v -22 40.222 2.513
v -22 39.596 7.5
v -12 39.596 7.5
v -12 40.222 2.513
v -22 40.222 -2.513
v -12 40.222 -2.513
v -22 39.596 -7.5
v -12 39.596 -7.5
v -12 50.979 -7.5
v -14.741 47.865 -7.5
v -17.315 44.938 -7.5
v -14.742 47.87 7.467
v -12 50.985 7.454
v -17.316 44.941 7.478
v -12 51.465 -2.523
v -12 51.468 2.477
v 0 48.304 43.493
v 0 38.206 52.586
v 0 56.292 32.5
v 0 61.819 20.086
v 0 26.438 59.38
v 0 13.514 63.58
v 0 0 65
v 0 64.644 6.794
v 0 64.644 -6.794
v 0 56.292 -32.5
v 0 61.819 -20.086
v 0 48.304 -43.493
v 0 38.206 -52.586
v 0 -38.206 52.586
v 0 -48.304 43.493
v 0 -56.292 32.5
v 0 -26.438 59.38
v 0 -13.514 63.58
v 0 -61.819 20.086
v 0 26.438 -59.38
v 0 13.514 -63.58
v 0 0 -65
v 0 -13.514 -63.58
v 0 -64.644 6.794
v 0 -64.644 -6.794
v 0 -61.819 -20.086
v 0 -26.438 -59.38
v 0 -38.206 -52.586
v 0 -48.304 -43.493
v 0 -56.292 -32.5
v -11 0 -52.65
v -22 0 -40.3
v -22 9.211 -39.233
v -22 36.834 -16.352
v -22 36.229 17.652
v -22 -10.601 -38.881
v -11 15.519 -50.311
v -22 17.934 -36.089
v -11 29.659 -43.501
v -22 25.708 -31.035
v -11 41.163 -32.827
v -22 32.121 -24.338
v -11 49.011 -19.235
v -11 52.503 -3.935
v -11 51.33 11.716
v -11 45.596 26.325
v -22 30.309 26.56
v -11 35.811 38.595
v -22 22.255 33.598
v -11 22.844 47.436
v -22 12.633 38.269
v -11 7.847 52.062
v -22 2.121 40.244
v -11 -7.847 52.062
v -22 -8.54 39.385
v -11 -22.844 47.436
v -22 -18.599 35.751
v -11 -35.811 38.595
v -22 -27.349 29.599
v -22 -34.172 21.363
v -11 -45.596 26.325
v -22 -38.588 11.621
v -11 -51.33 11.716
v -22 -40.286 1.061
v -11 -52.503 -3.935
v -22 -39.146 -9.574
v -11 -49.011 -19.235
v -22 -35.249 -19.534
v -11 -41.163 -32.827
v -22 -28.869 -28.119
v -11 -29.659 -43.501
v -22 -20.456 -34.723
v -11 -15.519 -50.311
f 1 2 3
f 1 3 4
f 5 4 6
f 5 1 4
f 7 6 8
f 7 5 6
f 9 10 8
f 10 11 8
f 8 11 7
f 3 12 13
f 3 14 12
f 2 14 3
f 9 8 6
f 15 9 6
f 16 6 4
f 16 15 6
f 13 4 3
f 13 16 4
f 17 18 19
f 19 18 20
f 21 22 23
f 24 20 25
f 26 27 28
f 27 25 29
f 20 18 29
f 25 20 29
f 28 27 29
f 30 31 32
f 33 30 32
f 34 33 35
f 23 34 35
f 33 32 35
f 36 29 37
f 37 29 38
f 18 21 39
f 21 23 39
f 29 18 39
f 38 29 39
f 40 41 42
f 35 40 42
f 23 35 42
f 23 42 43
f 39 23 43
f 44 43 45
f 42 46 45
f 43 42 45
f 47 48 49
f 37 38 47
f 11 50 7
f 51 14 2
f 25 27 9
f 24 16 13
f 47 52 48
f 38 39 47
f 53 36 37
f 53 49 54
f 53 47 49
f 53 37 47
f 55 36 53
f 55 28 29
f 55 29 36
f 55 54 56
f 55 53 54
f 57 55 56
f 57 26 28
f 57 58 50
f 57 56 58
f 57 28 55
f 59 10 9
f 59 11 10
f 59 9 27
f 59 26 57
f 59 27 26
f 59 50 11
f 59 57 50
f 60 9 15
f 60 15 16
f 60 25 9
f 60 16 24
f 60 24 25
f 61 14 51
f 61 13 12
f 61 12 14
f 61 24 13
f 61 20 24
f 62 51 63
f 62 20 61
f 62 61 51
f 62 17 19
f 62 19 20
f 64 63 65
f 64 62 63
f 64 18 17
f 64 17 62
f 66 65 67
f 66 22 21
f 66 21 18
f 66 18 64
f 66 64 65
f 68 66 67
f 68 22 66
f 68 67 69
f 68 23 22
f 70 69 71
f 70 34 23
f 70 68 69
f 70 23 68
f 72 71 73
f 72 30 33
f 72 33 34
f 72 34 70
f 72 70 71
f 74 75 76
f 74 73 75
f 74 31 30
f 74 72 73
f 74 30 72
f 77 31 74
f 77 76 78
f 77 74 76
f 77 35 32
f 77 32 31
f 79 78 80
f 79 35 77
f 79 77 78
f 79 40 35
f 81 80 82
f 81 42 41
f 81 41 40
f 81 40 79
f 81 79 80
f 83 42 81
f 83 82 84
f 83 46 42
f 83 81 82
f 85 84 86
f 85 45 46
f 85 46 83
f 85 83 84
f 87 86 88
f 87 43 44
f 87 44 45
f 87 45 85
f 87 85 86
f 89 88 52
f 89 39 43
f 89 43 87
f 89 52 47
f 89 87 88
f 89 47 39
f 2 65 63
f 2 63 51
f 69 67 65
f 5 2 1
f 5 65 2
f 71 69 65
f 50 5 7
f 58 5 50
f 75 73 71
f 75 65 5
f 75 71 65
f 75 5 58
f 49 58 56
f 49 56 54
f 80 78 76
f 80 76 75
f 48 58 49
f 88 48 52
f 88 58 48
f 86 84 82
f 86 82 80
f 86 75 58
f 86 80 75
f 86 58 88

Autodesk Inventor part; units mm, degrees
ref_plane "YZ Plane" through (0, 0, 0) normal (1, 0, 0) x (0, 1, 0)
ref_plane "XZ Plane" through (0, 0, 0) normal (0, 1, 0) x (-1, 0, 0)
ref_plane "XY Plane" through (0, 0, 0) normal (0, 0, 1) x (1, 0, 0)
sketch "Sketch2" plane through (0, 0, 0) normal (0, 1, 0) x (-1, 0, 0)
  line L0 (0, 0) -> (0, -65)
  line L1 (0, 0) -> (22, 0)
  line L2 (22, 0) -> (22, -40.3)
  line L3 (22, -40.3) -> (0, -65)
  dimension "d4" = 65
  dimension "d5" = 22
  dimension "d6" = 40.3
revolve "Revolution1" add sketch "Sketch2" angle 360 about axis through (0, 0, 0) along (-1, 0, 0)
sketch "Sketch3" plane through (-22, 0, 0) normal (-1, 0, 0) x (0, 0, 1)
  circle A0 centre (0, 0) radius 40.3 projected
  line L0 (0, 40.3) -> (0, 64.3)
  line L1 (0, 64.3) -> (-7.5, 64.3)
  line L2 (-7.5, 64.3) -> (-7.5, 39.596)
  line L3 (0, 64.3) -> (7.4, 64.3)
  line L4 (7.4, 64.3) -> (7.5, 39.596)
  arc A1 (7.5, 39.596) -> (-7.5, 39.596) centre (0, 0) ccw
  dimension "d11" = 24
  dimension "d12" = 7.5
  dimension "d13" = 7.4
extrude "Extrusion1" cut sketch "Sketch3" against normal blind 10 contours A0 L0 L3 L4 | L2 L1 L0 A0
properties part number "Handle Gearbox" material "PC/ABS Plastic"
